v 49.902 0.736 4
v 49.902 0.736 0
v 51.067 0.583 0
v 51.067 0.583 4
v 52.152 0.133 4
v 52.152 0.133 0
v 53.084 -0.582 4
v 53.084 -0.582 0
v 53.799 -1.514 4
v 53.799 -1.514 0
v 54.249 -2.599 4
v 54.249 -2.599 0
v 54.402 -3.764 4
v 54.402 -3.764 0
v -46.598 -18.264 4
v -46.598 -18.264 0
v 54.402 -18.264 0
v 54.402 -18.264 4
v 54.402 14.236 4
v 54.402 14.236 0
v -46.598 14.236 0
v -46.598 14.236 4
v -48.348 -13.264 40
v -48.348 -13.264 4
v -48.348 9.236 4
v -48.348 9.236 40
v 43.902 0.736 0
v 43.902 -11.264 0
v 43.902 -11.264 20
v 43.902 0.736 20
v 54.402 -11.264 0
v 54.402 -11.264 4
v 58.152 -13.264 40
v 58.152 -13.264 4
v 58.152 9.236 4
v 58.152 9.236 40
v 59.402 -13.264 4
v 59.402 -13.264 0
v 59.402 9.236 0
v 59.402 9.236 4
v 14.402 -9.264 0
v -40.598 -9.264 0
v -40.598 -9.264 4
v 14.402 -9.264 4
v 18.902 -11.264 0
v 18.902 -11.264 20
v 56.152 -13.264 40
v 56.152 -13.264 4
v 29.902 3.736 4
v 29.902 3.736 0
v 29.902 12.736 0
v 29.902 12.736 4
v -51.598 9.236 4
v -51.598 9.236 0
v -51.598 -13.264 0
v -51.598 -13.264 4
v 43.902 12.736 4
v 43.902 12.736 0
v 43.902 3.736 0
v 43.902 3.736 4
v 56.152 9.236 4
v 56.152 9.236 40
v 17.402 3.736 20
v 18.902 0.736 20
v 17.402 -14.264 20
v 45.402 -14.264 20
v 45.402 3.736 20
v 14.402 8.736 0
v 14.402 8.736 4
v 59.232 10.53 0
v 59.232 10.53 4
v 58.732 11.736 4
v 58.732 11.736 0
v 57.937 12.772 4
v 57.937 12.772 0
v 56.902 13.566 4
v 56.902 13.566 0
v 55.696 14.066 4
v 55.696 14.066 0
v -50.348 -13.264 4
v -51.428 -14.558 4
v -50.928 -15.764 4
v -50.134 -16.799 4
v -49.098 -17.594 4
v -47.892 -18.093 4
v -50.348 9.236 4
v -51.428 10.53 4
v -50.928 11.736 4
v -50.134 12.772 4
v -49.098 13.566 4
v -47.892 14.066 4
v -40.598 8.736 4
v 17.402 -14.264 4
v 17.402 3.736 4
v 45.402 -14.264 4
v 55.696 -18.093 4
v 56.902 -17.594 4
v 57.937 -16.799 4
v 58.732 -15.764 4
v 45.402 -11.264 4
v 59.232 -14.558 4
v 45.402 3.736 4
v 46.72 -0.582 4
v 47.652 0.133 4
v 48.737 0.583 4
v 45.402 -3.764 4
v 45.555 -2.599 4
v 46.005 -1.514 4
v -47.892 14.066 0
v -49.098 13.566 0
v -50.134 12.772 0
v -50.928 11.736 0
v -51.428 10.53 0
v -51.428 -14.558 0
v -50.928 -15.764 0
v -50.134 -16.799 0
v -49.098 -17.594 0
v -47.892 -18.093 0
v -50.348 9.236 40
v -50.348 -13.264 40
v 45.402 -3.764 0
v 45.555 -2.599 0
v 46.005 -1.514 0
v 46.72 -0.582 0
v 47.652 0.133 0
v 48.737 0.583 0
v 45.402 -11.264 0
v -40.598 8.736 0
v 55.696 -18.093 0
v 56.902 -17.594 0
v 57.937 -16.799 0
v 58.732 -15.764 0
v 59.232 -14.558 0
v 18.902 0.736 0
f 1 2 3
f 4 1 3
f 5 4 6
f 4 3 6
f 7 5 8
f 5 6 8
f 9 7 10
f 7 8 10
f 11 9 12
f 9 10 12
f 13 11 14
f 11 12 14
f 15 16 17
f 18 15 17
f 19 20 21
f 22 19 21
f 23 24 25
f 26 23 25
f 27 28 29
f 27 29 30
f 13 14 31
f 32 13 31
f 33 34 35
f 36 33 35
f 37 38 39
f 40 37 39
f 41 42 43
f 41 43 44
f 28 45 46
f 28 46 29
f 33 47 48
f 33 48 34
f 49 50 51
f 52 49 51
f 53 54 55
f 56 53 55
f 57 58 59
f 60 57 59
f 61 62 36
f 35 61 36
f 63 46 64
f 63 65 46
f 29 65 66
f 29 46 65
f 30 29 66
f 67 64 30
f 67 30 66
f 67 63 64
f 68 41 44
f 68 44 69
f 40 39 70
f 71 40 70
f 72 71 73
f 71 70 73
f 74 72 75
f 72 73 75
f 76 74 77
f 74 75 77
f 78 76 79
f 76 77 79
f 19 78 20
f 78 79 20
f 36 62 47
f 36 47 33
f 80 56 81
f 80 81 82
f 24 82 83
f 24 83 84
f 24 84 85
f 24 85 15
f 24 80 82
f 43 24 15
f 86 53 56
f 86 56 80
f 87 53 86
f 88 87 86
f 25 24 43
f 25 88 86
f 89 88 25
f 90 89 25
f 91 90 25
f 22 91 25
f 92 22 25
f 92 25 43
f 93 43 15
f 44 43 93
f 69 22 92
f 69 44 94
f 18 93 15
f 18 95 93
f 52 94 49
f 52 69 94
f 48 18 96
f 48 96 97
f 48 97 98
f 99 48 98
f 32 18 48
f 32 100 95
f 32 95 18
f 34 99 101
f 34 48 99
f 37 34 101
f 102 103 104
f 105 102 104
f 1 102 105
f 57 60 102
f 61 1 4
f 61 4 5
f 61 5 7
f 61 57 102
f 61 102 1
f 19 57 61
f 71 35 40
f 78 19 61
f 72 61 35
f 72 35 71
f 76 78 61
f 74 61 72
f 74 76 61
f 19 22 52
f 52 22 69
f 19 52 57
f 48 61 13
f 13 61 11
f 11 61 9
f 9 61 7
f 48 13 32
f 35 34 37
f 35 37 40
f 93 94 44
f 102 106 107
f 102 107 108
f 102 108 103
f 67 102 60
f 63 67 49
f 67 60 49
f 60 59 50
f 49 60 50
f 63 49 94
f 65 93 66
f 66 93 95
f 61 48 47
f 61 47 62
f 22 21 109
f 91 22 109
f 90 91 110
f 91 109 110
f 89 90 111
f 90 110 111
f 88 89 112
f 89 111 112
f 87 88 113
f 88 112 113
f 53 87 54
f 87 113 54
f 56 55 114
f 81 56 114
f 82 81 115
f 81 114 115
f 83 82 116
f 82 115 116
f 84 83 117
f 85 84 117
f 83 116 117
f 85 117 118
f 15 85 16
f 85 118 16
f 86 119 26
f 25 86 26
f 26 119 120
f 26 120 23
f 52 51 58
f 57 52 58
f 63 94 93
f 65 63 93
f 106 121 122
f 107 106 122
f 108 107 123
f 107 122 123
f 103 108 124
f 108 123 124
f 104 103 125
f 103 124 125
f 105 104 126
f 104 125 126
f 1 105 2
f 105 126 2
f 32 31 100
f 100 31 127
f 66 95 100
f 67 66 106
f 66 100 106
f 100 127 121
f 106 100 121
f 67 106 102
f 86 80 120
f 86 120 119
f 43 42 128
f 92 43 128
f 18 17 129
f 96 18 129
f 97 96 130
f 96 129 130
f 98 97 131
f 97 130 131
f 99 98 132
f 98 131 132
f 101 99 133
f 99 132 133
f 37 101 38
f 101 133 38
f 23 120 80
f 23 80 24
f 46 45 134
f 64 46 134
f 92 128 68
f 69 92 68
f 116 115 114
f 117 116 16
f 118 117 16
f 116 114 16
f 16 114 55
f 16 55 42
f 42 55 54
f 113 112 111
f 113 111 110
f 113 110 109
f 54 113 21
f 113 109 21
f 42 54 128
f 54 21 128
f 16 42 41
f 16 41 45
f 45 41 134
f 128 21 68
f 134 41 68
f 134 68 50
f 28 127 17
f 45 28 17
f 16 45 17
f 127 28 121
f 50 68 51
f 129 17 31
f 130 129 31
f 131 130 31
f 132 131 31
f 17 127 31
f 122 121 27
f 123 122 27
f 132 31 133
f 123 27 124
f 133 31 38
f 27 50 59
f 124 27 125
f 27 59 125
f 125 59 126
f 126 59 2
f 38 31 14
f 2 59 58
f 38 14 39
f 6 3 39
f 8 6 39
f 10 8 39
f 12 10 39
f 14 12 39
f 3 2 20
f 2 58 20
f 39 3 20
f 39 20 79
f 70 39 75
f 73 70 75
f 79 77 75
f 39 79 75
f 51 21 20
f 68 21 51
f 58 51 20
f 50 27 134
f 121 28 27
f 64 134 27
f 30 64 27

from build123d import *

# Parameters (mm, degrees)
F0_W     = 2
F0_H     = 22.5
F0_W_2   = 55
F0_H_2   = 18
F1_DEPTH = 4
F0_W_3   = 25
F0_H_3   = 12
F2_DEPTH = 20
F3_DEPTH = 40


with BuildPart() as f1:
    # F0 (on Top) → F1 (new body)
    with BuildSketch(Plane.XY):
        with BuildLine():
            Line((54.401939, 14.236366), (-46.598061, 14.236366))
            ThreePointArc((-46.598061, 14.236366), (-50.133595, 12.7719), (-51.598061, 9.236366))
            Line((-51.598061, 9.236366), (-51.598061, -13.263634))
            ThreePointArc((-51.598061, -13.263634), (-50.133595, -16.799168), (-46.598061, -18.263634))
            Line((-46.598061, -18.263634), (54.401939, -18.263634))
            ThreePointArc((54.401939, -18.263634), (57.937472, -16.799168), (59.401939, -13.263634))
            Line((59.401939, -13.263634), (59.401939, 9.236366))
            ThreePointArc((59.401939, 9.236366), (57.937472, 12.7719), (54.401939, 14.236366))
        make_face()
        with Locations((-49.348061, -2.013634)):
            Rectangle(F0_W, F0_H, mode=Mode.SUBTRACT)
        with Locations((-13.098061, -0.263634)):
            Rectangle(F0_W_2, F0_H_2, mode=Mode.SUBTRACT)
        with BuildLine():
            Line((54.401939, -11.263634), (45.401939, -11.263634))
            Line((45.401939, -11.263634), (45.401939, -14.263634))
            Line((45.401939, -14.263634), (18.901939, -14.263634))
            Line((18.901939, -14.263634), (17.401939, -14.263634))
            Line((17.401939, -14.263634), (17.401939, 3.736366))
            Line((17.401939, 3.736366), (29.901939, 3.736366))
            Line((29.901939, 3.736366), (29.901939, 12.736366))
            Line((29.901939, 12.736366), (43.901939, 12.736366))
            Line((43.901939, 12.736366), (43.901939, 3.736366))
            Line((43.901939, 3.736366), (45.401939, 3.736366))
            Line((45.401939, 3.736366), (45.401939, 0.736366))
            Line((45.401939, 0.736366), (45.401939, -3.763634))
            ThreePointArc((45.401939, -3.763634), (46.719958, -0.581654), (49.901939, 0.736366))
            ThreePointArc((49.901939, 0.736366), (53.083919, -0.581654), (54.401939, -3.763634))
            Line((54.401939, -3.763634), (54.401939, -11.263634))
        make_face(mode=Mode.SUBTRACT)
        with Locations((57.151939, -2.013634)):
            Rectangle(F0_W, F0_H, mode=Mode.SUBTRACT)
    extrude(amount=F1_DEPTH)

    # F0 (on Top) → F2 (join)
    with BuildSketch(Plane.XY):
        Polygon((45.401939, -14.263634), (45.401939, -11.263634), (45.401939, -3.763634), (45.401939, 0.736366), (45.401939, 3.736366), (43.901939, 3.736366), (29.901939, 3.736366), (17.401939, 3.736366), (17.401939, -14.263634), (18.901939, -14.263634), align=None)
        with Locations((31.401939, -5.263634)):
            Rectangle(F0_W_3, F0_H_3, mode=Mode.SUBTRACT)
    extrude(amount=F2_DEPTH)

    # F0 (on Top) → F3 (join)
    with BuildSketch(Plane.XY):
        with Locations((57.151939, -2.013634)):
            Rectangle(F0_W, F0_H)
        with Locations((-49.348061, -2.013634)):
            Rectangle(F0_W, F0_H)
    extrude(amount=F3_DEPTH)


solid = f1.part
